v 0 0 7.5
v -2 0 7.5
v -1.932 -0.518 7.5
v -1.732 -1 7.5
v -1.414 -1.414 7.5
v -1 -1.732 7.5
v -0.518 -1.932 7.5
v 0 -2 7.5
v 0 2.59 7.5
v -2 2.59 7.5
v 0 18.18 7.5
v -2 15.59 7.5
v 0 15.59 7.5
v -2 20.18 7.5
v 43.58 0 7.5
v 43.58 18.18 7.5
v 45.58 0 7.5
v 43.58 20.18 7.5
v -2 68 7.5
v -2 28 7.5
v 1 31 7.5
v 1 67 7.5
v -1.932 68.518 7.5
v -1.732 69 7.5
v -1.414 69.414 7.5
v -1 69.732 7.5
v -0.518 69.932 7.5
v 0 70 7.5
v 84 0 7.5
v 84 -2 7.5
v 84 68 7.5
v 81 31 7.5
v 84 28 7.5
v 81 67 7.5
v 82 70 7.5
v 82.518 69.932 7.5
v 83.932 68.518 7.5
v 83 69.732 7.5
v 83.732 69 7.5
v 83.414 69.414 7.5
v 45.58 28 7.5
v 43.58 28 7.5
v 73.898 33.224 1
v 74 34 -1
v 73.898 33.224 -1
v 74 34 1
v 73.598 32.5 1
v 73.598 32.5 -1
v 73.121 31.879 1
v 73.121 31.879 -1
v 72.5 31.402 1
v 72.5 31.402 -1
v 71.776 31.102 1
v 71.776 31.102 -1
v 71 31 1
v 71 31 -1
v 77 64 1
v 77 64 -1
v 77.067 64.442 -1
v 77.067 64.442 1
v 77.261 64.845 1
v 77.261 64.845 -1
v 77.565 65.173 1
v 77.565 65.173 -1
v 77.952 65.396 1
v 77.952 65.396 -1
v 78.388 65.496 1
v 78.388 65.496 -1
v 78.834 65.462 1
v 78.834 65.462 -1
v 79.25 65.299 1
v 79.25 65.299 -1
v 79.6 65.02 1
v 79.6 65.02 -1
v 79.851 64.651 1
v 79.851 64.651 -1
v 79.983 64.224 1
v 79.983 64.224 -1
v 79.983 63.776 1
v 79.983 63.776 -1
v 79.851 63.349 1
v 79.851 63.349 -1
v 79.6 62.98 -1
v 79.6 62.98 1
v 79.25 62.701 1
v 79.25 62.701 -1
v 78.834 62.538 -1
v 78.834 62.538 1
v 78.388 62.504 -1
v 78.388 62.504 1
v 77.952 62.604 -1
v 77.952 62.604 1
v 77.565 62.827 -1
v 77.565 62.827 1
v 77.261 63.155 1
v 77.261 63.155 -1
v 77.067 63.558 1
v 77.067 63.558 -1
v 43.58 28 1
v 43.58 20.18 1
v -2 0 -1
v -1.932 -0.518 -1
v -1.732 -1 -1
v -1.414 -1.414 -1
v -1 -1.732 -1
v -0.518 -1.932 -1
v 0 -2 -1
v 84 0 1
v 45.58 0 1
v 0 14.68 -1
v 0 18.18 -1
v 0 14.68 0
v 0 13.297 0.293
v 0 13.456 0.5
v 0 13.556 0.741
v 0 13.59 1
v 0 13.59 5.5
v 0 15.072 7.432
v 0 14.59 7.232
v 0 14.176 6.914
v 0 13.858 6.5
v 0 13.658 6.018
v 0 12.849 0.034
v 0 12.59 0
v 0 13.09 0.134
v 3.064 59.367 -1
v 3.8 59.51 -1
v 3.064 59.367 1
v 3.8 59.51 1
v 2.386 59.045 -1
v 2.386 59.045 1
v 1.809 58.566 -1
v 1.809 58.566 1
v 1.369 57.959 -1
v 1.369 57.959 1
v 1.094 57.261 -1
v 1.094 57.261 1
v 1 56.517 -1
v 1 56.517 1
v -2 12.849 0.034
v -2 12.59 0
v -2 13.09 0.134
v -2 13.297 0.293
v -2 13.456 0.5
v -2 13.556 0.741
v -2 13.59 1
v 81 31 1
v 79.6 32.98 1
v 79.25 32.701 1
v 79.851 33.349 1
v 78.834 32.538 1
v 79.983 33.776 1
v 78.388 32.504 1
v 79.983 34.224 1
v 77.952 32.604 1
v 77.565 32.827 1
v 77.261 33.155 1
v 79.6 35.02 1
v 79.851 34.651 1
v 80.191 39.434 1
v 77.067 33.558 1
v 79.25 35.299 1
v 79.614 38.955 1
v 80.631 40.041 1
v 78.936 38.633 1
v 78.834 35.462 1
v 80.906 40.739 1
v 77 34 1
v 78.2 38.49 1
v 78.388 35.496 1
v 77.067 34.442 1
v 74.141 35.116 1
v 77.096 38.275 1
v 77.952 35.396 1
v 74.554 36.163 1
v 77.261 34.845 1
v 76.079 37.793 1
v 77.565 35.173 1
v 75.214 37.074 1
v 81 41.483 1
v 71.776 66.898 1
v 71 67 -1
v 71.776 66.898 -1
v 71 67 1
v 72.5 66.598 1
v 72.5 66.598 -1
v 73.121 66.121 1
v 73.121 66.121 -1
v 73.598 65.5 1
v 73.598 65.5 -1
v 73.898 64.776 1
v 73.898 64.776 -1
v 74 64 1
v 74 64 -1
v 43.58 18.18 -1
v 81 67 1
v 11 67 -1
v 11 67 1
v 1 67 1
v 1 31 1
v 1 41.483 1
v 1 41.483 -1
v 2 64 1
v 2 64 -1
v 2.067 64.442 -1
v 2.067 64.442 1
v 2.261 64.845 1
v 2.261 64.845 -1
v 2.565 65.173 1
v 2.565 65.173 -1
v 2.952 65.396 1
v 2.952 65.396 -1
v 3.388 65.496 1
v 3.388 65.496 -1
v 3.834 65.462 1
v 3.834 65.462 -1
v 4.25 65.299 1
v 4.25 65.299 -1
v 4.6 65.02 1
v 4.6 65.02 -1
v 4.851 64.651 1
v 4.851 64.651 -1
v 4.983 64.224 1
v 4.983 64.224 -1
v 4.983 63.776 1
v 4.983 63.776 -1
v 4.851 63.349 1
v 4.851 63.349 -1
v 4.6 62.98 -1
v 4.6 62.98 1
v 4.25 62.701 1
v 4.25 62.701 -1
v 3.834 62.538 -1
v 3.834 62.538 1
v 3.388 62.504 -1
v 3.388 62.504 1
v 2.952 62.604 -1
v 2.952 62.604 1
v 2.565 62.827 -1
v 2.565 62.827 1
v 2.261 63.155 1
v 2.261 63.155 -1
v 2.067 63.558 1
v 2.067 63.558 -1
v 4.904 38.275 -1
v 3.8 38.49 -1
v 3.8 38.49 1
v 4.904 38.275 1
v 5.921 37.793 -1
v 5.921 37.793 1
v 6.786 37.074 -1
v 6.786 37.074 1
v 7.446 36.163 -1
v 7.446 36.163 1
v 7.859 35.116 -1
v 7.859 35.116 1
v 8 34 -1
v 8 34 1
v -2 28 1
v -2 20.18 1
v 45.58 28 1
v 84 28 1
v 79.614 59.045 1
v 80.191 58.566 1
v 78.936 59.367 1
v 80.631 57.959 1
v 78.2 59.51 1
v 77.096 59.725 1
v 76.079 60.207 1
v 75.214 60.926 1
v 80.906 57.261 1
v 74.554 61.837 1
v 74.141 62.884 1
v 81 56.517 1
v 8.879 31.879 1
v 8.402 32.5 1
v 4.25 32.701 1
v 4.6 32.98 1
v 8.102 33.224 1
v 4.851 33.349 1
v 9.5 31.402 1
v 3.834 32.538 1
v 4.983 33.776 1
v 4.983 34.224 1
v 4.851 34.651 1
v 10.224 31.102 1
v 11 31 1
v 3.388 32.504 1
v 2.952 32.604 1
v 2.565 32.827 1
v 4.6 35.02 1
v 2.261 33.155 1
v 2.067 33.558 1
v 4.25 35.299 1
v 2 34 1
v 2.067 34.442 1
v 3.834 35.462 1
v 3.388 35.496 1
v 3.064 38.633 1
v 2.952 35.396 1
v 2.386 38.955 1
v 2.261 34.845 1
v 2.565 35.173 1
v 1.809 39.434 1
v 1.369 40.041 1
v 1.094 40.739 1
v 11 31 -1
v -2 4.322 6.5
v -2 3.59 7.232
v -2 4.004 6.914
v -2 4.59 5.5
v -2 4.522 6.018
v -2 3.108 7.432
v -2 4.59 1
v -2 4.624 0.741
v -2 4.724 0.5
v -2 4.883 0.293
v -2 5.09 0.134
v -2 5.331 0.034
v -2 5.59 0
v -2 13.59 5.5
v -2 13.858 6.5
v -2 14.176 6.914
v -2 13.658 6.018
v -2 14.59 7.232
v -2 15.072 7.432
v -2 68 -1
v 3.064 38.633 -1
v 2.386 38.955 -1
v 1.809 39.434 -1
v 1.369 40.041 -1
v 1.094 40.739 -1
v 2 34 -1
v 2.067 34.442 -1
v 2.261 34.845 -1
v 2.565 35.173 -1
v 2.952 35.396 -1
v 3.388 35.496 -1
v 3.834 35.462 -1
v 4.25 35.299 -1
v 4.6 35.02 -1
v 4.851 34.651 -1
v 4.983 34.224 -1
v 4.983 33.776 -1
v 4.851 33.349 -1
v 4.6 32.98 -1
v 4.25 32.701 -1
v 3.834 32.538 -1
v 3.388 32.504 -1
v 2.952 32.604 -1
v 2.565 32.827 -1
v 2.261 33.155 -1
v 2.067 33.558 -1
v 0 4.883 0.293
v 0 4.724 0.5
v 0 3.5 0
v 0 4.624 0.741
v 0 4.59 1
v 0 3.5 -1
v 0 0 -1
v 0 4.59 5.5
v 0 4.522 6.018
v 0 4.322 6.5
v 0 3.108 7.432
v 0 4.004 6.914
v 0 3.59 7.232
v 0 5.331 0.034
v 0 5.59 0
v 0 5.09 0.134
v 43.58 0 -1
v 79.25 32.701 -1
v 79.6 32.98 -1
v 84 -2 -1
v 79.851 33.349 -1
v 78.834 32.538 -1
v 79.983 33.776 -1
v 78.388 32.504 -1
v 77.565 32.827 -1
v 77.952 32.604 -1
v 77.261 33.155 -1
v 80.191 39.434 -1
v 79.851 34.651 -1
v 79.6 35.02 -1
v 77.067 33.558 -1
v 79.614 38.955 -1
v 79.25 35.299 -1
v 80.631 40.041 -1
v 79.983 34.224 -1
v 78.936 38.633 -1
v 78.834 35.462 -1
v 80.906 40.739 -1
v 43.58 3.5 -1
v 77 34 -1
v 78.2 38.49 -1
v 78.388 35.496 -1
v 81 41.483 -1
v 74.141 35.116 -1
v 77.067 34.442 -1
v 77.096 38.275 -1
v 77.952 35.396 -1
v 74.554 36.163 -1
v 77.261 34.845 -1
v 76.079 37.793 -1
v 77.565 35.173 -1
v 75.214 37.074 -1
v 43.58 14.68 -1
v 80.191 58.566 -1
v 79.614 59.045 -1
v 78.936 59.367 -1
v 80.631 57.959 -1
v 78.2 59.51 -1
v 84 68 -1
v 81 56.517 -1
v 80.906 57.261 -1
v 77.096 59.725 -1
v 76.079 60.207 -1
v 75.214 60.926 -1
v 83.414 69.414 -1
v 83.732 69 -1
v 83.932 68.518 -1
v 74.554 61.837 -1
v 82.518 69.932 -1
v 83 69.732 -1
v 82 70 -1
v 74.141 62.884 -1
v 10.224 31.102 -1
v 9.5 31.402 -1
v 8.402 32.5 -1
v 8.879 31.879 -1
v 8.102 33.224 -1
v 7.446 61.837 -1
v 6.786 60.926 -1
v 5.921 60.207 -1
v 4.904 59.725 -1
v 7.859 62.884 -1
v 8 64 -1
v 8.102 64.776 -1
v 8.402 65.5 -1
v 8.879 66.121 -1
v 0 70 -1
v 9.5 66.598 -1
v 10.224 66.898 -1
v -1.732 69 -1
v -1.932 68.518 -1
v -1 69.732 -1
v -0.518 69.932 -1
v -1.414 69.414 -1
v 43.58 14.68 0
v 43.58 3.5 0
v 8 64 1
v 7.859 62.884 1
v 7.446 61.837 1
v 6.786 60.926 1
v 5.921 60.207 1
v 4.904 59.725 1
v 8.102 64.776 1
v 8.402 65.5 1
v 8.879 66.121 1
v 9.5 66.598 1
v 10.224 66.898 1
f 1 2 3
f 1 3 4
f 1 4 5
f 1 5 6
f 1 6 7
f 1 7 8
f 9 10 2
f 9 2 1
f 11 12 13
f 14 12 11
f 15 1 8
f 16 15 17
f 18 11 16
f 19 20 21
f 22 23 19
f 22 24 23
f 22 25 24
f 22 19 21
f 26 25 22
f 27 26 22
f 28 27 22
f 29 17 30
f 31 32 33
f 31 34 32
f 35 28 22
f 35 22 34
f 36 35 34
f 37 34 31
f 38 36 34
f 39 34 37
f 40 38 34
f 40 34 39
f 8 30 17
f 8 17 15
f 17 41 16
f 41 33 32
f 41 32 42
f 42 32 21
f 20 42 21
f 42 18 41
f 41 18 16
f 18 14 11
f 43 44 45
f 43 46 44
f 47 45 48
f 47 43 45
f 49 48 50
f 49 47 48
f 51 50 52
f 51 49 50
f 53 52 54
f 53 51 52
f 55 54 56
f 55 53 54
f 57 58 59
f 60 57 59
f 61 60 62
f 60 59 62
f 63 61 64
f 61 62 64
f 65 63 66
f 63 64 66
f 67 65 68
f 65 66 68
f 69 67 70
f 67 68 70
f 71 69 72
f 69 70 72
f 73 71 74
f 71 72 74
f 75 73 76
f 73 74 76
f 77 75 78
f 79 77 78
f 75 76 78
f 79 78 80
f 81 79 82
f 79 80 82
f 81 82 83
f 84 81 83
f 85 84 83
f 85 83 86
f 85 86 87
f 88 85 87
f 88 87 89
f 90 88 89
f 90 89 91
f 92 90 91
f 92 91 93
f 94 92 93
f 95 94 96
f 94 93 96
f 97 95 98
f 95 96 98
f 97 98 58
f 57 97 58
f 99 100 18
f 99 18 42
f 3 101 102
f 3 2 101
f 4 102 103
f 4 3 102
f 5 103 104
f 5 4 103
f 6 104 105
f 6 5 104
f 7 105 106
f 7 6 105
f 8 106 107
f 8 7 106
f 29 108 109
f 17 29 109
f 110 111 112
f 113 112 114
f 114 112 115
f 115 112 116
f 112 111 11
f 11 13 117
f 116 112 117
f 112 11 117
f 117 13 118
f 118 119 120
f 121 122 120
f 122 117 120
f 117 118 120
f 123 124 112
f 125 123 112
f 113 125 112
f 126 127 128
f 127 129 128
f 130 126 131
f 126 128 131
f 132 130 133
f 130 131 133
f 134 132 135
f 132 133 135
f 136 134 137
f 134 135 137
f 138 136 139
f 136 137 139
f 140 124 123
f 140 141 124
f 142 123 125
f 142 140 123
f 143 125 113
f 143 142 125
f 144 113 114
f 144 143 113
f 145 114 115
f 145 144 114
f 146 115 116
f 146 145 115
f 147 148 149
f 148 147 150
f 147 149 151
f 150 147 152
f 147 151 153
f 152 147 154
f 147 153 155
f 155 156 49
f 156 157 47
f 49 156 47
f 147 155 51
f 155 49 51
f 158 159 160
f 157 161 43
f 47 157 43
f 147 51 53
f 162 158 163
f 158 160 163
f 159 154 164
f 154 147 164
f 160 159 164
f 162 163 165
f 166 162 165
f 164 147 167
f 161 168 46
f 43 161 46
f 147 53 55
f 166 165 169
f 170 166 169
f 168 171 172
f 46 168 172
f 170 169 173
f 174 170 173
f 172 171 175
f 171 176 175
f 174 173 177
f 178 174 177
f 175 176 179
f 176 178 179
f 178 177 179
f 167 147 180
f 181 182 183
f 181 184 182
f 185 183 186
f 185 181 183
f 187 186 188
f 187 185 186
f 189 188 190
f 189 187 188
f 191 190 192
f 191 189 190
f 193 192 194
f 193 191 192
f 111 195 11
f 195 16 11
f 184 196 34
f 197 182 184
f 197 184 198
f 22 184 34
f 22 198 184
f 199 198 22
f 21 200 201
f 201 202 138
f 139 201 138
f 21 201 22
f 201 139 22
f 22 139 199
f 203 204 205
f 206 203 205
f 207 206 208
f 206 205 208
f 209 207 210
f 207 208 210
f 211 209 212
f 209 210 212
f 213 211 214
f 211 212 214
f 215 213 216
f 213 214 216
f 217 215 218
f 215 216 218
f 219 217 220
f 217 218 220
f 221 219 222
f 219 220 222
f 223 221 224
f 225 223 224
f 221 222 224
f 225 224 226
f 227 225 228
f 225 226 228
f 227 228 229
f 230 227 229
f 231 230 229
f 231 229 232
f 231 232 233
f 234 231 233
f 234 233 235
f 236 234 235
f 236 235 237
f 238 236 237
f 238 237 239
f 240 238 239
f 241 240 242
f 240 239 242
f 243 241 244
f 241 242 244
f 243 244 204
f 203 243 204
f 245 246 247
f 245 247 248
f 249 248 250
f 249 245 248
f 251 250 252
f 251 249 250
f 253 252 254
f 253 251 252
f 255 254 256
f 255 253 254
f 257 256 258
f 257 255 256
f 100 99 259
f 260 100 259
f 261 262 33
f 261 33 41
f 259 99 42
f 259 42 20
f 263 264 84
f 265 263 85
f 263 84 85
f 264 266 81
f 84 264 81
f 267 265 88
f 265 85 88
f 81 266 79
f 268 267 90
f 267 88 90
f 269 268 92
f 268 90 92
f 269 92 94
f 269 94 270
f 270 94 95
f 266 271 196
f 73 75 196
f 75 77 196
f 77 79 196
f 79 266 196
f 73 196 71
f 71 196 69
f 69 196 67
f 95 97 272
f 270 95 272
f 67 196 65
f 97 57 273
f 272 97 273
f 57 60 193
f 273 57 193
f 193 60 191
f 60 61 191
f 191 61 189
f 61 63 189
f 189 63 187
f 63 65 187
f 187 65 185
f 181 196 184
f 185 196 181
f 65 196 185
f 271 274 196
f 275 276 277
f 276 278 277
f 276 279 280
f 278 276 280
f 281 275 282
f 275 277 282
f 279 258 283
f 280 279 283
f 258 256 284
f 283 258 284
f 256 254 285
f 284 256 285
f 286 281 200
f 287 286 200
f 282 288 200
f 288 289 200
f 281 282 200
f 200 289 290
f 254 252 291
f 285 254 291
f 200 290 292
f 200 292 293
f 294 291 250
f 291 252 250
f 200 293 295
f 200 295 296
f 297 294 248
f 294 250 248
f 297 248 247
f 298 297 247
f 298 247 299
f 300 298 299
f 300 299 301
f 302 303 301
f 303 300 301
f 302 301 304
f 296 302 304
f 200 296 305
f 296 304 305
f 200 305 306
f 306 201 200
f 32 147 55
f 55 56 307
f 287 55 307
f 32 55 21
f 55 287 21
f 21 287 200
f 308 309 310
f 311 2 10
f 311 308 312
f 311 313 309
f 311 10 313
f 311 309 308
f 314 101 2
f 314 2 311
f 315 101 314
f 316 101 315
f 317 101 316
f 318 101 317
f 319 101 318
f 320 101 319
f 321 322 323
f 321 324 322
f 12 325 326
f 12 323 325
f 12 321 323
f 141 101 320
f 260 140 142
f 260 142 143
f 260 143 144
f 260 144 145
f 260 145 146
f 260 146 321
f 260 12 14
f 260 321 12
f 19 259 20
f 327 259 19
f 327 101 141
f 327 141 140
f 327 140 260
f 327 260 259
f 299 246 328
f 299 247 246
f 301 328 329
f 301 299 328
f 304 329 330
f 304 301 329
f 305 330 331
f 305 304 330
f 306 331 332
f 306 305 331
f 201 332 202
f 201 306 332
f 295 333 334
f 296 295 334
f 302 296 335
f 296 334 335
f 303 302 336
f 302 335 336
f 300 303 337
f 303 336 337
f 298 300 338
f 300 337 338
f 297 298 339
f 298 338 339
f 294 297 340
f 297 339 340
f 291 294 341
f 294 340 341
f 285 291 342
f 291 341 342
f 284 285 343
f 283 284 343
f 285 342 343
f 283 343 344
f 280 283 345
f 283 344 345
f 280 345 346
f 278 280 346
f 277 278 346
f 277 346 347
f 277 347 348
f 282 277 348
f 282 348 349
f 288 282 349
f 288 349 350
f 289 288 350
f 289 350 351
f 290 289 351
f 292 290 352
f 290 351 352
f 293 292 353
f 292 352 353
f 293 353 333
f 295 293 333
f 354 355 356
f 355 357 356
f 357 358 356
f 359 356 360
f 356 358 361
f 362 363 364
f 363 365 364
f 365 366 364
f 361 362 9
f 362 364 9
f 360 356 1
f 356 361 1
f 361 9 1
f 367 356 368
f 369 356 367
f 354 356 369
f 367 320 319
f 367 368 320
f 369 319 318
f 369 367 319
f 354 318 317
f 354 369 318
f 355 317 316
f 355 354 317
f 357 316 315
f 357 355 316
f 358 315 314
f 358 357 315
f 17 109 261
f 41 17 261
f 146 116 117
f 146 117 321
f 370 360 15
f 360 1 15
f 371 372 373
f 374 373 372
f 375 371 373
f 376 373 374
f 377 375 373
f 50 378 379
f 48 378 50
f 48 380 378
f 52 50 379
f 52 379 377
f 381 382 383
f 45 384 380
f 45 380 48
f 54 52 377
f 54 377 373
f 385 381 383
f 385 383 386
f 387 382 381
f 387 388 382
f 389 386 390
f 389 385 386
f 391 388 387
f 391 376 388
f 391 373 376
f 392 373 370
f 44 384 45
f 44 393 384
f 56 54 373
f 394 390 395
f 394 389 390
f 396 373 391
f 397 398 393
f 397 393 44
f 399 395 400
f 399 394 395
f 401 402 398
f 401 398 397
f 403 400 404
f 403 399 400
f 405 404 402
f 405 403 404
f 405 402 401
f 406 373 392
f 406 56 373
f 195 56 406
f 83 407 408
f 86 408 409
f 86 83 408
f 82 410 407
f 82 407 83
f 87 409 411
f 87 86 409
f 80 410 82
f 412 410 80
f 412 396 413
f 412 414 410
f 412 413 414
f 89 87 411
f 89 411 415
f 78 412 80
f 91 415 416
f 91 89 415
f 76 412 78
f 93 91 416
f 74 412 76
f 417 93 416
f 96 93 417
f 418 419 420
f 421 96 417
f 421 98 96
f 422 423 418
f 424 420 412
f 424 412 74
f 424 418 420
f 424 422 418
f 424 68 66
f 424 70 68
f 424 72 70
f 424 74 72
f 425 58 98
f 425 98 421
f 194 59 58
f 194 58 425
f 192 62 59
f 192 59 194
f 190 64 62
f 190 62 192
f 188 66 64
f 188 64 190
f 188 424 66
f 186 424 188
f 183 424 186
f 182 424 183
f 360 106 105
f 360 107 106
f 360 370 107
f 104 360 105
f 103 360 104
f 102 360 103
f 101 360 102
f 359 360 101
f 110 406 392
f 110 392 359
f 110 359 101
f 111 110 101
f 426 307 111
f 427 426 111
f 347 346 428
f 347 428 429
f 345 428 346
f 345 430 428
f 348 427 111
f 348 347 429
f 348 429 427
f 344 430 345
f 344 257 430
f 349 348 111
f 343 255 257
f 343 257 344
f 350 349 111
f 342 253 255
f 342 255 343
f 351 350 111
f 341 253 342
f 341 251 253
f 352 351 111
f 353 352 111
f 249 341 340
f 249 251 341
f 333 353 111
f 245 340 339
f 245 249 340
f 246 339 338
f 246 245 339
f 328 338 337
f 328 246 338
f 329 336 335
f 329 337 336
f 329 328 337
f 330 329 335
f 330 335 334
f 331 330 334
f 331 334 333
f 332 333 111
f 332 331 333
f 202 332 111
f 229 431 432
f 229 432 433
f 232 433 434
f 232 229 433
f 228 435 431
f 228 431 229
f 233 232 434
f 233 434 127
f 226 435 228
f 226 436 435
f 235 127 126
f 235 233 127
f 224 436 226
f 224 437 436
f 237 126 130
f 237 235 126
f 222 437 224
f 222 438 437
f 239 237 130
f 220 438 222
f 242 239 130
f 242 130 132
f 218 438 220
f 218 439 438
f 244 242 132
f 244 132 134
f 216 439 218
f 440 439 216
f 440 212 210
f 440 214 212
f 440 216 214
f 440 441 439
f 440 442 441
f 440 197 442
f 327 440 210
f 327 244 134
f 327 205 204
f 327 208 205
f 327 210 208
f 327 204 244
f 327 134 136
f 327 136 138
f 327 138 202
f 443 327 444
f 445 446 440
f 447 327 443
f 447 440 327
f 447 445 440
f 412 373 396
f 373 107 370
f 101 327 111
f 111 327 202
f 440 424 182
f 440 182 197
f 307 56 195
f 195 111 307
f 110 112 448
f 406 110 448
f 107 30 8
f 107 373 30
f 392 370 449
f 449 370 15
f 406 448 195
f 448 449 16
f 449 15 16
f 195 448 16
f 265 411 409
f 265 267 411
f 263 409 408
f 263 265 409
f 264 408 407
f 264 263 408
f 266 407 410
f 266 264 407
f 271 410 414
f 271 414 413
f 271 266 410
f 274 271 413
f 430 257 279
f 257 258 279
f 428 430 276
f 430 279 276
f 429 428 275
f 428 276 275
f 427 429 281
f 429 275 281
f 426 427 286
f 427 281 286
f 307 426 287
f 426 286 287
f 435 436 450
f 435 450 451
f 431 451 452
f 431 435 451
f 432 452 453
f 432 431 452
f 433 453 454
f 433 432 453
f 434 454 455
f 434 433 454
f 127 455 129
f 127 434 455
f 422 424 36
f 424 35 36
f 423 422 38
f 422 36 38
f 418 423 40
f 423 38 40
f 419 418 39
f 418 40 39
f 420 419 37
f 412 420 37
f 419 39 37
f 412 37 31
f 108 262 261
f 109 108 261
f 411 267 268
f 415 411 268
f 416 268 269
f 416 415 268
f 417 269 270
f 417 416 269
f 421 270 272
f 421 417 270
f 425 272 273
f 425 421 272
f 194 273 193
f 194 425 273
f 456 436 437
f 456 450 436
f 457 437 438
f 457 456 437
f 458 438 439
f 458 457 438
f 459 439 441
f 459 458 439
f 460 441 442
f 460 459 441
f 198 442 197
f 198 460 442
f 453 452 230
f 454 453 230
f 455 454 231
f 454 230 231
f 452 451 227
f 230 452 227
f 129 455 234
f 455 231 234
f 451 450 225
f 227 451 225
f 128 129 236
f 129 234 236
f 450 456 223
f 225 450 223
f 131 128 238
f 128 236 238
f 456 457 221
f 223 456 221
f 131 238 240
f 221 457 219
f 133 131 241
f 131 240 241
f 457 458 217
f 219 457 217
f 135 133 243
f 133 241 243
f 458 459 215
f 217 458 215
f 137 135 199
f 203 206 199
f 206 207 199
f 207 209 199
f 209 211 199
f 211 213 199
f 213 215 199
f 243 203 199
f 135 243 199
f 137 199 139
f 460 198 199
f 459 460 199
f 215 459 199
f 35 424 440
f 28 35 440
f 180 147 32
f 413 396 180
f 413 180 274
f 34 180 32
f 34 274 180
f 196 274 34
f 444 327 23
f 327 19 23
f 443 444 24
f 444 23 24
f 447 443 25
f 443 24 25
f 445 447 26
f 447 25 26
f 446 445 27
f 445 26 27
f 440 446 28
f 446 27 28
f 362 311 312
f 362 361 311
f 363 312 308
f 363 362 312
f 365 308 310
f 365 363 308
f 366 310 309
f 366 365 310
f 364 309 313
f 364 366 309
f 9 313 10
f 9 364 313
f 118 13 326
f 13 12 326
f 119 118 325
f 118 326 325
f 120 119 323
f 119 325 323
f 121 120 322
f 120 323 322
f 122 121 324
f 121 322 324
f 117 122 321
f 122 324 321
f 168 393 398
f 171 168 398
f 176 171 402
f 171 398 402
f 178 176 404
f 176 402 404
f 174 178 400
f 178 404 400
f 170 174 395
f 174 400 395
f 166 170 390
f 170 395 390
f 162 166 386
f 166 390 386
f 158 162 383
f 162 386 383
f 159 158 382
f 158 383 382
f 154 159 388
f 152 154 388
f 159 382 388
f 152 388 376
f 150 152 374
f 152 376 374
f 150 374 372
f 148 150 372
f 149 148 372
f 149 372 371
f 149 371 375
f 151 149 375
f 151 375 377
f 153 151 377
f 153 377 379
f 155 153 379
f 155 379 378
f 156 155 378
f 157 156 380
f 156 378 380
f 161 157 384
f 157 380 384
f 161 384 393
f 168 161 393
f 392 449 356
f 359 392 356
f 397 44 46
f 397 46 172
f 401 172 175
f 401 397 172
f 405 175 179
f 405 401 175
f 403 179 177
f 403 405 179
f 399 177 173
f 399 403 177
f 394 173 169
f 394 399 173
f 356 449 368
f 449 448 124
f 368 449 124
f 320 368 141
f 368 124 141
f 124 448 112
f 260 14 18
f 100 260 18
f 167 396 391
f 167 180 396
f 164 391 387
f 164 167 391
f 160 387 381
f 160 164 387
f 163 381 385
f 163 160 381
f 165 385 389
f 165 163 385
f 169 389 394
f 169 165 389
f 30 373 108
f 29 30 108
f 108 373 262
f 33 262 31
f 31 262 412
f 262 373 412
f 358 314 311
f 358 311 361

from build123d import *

# Parameters (mm, degrees)
BOSS_EXTRUDE1_DEPTH = 7.5
SKETCH2_W           = 2
SKETCH2_H           = 9
BOSS_EXTRUDE2_DEPTH = 1
SKETCH3_W           = 38.42
SKETCH3_H           = 2
SKETCH3_W_2         = 86
SKETCH3_H_2         = 42
SKETCH3_W_3         = 80
SKETCH3_H_3         = 36
BOSS_EXTRUDE3_DEPTH = 8.5
SKETCH3_3_R         = 1.5
SKETCH3_3_W         = 47.58
SKETCH3_3_H         = 7.82
BOSS_EXTRUDE4_DEPTH = 2
FILLET1_R           = 3
FILLET2_R           = 2
SKETCH6_W           = 2
SKETCH6_H           = 7.82
BOSS_EXTRUDE5_DEPTH = 6.5
FILLET3_R           = 1
FILLET4_R           = 2


with BuildPart() as part:
    # Sketch1 → Boss-Extrude1 (new body)
    with BuildSketch(Plane.XY):
        Polygon((-2, -2), (-2, 4.59), (0, 4.59), (0, 0), (43.58, 0), (43.58, 18.18), (0, 18.18), (0, 13.59), (-2, 13.59), (-2, 20.18), (45.58, 20.18), (45.58, -2), align=None)
    extrude(amount=BOSS_EXTRUDE1_DEPTH)

    # Sketch2 → Boss-Extrude2 (add)
    with BuildSketch(Plane(origin=(0, 0, 0), x_dir=(-1, 0, 0), z_dir=(0, 0, -1))):
        with Locations((1, 9.09)):
            Rectangle(SKETCH2_W, SKETCH2_H)
        Polygon((0, 4.59), (0, 13.59), (0, 14.68), (-43.58, 14.68), (-43.58, 3.5), (0, 3.5), align=None)
        Polygon((2, 13.59), (2, 20.18), (-45.58, 20.18), (-45.58, -2), (2, -2), (2, 4.59), (0, 4.59), (0, 3.5), (0, 0), (-43.58, 0), (-43.58, 3.5), (-43.58, 14.68), (-43.58, 18.18), (0, 18.18), (0, 14.68), (0, 13.59), align=None)
    extrude(amount=BOSS_EXTRUDE2_DEPTH)

    # Sketch3 → Boss-Extrude3 (add)
    with BuildSketch(Plane(origin=(0, 0, -1), x_dir=(-1, 0, 0), z_dir=(0, 0, -1))):
        with Locations((-64.79, -1)):
            Rectangle(SKETCH3_W, SKETCH3_H)
        with Locations((-41, 49)):
            Rectangle(SKETCH3_W_2, SKETCH3_H_2)
        with Locations((-41, 49)):
            Rectangle(SKETCH3_W_3, SKETCH3_H_3, mode=Mode.SUBTRACT)
    extrude(amount=-BOSS_EXTRUDE3_DEPTH)

    # Sketch3<3> → Boss-Extrude4 (add)
    with BuildSketch(Plane(origin=(0, 0, -1), x_dir=(-1, 0, 0), z_dir=(0, 0, -1))):
        with BuildLine():
            Line((-6.854101966, 31), (-1, 31))
            Line((-1, 31), (-1, 37.741657387))
            ThreePointArc((-1, 37.741657387), (-6.897772597, 36.950447657), (-6.854101966, 31))
        make_face()
        with Locations((-3.5, 34)):
            Circle(SKETCH3_3_R, mode=Mode.SUBTRACT)
        with BuildLine():
            ThreePointArc((-6.854101966, 67), (-6.897772597, 61.049552343), (-1, 60.258342613))
            Line((-1, 60.258342613), (-1, 67))
            Line((-1, 67), (-6.854101966, 67))
        make_face()
        with Locations((-3.5, 64)):
            Circle(SKETCH3_3_R, mode=Mode.SUBTRACT)
        with BuildLine():
            Line((-81, 67), (-81, 60.258342613))
            ThreePointArc((-81, 60.258342613), (-75.102227403, 61.049552343), (-75.145898034, 67))
            Line((-75.145898034, 67), (-81, 67))
        make_face()
        with Locations((-78.5, 64)):
            Circle(SKETCH3_3_R, mode=Mode.SUBTRACT)
        with BuildLine():
            Line((-81, 31), (-75.145898034, 31))
            ThreePointArc((-75.145898034, 31), (-75.102227403, 36.950447657), (-81, 37.741657387))
            Line((-81, 37.741657387), (-81, 31))
        make_face()
        with Locations((-78.5, 34)):
            Circle(SKETCH3_3_R, mode=Mode.SUBTRACT)
        with Locations((-21.79, 24.09)):
            Rectangle(SKETCH3_3_W, SKETCH3_3_H)
        Polygon((-84, 0), (-45.58, 0), (-45.58, 20.18), (-45.58, 28), (-84, 28), align=None)
    extrude(amount=-BOSS_EXTRUDE4_DEPTH)

    # Fillet1
    fillet1_edges = [part.edges().sort_by_distance(p)[0] for p in [
        (1, 37.741657387, 0),
        (6.854101966, 31, 0),
        (6.854101966, 67, 0),
        (1, 60.258342613, 0),
        (81, 60.258342613, 0),
        (75.145898034, 67, 0),
        (75.145898034, 31, 0),
        (81, 37.741657387, 0),
    ]]
    fillet(fillet1_edges, radius=FILLET1_R)

    # Fillet2
    fillet2_edges = [part.edges().sort_by_distance(p)[0] for p in [
        (-2, -2, 3.25),
        (-2, 70, 3.25),
        (84, 70, 3.25),
    ]]
    fillet(fillet2_edges, radius=FILLET2_R)

    # Sketch6 → Boss-Extrude5 (add)
    with BuildSketch(Plane.XY.offset(1)):
        with Locations((44.58, 24.09)):
            Rectangle(SKETCH6_W, SKETCH6_H)
    extrude(amount=BOSS_EXTRUDE5_DEPTH)

    # Fillet3
    fillet3_edges = [part.edges().sort_by_distance(p)[0] for p in [
        (-1, 4.59, 0),
        (-1, 13.59, 0),
    ]]
    fillet(fillet3_edges, radius=FILLET3_R)

    # Fillet4
    fillet4_edges = [part.edges().sort_by_distance(p)[0] for p in [
        (-1, 4.59, 7.5),
        (-1, 13.59, 7.5),
    ]]
    fillet(fillet4_edges, radius=FILLET4_R)


solid = part.part
